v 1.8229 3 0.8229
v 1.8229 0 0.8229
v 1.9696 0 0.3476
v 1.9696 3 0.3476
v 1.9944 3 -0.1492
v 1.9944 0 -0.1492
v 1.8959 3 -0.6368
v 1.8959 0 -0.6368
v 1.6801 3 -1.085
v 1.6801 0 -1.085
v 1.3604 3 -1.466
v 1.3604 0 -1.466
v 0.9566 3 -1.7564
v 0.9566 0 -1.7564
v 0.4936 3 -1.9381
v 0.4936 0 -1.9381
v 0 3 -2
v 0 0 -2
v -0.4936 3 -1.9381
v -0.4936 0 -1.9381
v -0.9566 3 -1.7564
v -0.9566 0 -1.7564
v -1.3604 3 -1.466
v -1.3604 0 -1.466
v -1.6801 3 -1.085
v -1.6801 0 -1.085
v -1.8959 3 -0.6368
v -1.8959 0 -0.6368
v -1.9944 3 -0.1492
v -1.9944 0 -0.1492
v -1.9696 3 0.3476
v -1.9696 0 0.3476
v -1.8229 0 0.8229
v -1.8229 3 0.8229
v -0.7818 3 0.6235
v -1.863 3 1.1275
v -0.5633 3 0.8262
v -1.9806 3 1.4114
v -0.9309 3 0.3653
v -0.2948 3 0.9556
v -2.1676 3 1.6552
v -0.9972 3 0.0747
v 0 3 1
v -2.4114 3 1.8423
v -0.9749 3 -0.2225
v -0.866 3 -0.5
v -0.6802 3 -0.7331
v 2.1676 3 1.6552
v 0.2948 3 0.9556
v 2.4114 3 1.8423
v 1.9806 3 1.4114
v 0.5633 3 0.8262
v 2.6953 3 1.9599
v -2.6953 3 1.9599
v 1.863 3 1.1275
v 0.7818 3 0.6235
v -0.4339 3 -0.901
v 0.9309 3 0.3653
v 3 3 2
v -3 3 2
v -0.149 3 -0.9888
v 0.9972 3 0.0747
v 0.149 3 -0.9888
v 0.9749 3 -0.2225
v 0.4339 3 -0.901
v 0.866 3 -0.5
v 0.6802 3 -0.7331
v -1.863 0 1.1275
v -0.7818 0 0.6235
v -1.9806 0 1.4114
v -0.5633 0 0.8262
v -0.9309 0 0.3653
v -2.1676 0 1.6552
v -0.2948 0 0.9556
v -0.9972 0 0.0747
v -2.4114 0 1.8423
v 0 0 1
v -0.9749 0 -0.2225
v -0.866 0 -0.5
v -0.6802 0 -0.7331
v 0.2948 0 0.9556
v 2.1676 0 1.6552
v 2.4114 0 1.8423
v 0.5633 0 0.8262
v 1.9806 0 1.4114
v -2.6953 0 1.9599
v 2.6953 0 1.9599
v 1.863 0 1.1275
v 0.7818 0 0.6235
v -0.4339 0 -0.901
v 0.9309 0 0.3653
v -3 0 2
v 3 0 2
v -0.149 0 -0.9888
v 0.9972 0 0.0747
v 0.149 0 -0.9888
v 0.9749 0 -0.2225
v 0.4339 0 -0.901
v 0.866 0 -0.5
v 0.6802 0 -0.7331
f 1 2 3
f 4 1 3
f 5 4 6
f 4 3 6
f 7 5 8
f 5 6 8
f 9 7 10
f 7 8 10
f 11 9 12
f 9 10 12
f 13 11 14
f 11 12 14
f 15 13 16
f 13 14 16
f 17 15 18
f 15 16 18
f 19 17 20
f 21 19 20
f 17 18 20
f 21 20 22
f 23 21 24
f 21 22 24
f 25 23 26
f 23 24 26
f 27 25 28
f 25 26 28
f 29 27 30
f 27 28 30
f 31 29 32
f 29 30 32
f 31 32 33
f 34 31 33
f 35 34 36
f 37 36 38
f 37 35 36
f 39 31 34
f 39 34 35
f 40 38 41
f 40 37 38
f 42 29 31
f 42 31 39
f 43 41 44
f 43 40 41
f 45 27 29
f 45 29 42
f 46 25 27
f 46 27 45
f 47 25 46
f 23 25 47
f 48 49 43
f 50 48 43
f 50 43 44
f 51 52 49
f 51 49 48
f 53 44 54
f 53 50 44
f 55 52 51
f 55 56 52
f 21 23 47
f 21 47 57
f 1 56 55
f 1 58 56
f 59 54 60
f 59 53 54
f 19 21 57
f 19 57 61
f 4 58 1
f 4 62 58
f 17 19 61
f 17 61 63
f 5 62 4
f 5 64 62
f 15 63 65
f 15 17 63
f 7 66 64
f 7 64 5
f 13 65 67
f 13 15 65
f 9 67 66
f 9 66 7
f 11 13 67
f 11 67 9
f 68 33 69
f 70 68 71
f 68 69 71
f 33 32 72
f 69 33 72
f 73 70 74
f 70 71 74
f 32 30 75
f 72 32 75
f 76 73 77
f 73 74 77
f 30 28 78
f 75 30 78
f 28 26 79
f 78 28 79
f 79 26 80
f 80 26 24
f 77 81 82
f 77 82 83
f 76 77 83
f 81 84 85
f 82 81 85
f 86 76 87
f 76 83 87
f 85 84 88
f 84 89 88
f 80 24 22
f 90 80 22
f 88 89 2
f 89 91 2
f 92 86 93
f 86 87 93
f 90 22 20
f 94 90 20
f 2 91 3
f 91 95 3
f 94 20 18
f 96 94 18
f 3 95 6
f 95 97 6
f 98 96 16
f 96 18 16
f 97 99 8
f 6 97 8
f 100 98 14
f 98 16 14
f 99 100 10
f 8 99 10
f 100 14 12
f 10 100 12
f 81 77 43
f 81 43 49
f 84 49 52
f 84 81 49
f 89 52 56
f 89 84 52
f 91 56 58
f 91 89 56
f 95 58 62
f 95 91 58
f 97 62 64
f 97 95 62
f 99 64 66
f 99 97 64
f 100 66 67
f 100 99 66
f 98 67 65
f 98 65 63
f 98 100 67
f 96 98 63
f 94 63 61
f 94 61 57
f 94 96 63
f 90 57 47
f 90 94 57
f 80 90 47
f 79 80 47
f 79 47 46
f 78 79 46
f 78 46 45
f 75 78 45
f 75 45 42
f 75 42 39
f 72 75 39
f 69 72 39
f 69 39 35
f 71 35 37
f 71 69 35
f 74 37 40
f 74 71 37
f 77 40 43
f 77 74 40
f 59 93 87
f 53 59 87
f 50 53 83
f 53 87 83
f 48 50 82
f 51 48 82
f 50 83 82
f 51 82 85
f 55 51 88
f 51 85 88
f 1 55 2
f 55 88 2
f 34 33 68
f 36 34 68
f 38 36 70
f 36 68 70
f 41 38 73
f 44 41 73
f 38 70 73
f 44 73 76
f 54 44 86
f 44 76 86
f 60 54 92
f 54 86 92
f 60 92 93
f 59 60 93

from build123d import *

# Parameters (mm, degrees)
SKETCH_1_R      = 2
SKETCH_1_R_2    = 1
EXTRUDE_1_DEPTH = 3
EXTRUDE_START   = -3
EXTRUDE_2_DEPTH = 3


with BuildPart() as part:
    # 草图1 → 凸台-拉伸1 (new body)
    with BuildSketch(Plane(origin=(0, 0, 0), x_dir=(1, 0, 0), z_dir=(0, 1, 0))):
        with Locations(Location((0, 0, 0), (0, 0, 270))):
            Circle(SKETCH_1_R)
        with Locations(Location((0, 0, 0), (0, 0, 270))):
            Circle(SKETCH_1_R_2, mode=Mode.SUBTRACT)
    extrude(amount=EXTRUDE_1_DEPTH)

    # 草图2 → 凸台-拉伸2 (add)
    with BuildSketch(Plane(origin=(0, 3, 0), x_dir=(1, 0, 0), z_dir=(0, 1, 0)).offset(EXTRUDE_START)):
        with BuildLine():
            Line((-3, -2), (0, -2))
            ThreePointArc((0, -2), (-1.084953614, -1.680141558), (-1.822875656, -0.822875656))
            ThreePointArc((-1.822875656, -0.822875656), (-2.167647394, -1.655228262), (-3, -2))
        make_face()
        with BuildLine():
            ThreePointArc((1.822875656, -0.822875656), (1.084953614, -1.680141558), (0, -2))
            Line((0, -2), (3, -2))
            ThreePointArc((3, -2), (2.167647394, -1.655228262), (1.822875656, -0.822875656))
        make_face()
    extrude(amount=EXTRUDE_2_DEPTH)


solid = part.part
